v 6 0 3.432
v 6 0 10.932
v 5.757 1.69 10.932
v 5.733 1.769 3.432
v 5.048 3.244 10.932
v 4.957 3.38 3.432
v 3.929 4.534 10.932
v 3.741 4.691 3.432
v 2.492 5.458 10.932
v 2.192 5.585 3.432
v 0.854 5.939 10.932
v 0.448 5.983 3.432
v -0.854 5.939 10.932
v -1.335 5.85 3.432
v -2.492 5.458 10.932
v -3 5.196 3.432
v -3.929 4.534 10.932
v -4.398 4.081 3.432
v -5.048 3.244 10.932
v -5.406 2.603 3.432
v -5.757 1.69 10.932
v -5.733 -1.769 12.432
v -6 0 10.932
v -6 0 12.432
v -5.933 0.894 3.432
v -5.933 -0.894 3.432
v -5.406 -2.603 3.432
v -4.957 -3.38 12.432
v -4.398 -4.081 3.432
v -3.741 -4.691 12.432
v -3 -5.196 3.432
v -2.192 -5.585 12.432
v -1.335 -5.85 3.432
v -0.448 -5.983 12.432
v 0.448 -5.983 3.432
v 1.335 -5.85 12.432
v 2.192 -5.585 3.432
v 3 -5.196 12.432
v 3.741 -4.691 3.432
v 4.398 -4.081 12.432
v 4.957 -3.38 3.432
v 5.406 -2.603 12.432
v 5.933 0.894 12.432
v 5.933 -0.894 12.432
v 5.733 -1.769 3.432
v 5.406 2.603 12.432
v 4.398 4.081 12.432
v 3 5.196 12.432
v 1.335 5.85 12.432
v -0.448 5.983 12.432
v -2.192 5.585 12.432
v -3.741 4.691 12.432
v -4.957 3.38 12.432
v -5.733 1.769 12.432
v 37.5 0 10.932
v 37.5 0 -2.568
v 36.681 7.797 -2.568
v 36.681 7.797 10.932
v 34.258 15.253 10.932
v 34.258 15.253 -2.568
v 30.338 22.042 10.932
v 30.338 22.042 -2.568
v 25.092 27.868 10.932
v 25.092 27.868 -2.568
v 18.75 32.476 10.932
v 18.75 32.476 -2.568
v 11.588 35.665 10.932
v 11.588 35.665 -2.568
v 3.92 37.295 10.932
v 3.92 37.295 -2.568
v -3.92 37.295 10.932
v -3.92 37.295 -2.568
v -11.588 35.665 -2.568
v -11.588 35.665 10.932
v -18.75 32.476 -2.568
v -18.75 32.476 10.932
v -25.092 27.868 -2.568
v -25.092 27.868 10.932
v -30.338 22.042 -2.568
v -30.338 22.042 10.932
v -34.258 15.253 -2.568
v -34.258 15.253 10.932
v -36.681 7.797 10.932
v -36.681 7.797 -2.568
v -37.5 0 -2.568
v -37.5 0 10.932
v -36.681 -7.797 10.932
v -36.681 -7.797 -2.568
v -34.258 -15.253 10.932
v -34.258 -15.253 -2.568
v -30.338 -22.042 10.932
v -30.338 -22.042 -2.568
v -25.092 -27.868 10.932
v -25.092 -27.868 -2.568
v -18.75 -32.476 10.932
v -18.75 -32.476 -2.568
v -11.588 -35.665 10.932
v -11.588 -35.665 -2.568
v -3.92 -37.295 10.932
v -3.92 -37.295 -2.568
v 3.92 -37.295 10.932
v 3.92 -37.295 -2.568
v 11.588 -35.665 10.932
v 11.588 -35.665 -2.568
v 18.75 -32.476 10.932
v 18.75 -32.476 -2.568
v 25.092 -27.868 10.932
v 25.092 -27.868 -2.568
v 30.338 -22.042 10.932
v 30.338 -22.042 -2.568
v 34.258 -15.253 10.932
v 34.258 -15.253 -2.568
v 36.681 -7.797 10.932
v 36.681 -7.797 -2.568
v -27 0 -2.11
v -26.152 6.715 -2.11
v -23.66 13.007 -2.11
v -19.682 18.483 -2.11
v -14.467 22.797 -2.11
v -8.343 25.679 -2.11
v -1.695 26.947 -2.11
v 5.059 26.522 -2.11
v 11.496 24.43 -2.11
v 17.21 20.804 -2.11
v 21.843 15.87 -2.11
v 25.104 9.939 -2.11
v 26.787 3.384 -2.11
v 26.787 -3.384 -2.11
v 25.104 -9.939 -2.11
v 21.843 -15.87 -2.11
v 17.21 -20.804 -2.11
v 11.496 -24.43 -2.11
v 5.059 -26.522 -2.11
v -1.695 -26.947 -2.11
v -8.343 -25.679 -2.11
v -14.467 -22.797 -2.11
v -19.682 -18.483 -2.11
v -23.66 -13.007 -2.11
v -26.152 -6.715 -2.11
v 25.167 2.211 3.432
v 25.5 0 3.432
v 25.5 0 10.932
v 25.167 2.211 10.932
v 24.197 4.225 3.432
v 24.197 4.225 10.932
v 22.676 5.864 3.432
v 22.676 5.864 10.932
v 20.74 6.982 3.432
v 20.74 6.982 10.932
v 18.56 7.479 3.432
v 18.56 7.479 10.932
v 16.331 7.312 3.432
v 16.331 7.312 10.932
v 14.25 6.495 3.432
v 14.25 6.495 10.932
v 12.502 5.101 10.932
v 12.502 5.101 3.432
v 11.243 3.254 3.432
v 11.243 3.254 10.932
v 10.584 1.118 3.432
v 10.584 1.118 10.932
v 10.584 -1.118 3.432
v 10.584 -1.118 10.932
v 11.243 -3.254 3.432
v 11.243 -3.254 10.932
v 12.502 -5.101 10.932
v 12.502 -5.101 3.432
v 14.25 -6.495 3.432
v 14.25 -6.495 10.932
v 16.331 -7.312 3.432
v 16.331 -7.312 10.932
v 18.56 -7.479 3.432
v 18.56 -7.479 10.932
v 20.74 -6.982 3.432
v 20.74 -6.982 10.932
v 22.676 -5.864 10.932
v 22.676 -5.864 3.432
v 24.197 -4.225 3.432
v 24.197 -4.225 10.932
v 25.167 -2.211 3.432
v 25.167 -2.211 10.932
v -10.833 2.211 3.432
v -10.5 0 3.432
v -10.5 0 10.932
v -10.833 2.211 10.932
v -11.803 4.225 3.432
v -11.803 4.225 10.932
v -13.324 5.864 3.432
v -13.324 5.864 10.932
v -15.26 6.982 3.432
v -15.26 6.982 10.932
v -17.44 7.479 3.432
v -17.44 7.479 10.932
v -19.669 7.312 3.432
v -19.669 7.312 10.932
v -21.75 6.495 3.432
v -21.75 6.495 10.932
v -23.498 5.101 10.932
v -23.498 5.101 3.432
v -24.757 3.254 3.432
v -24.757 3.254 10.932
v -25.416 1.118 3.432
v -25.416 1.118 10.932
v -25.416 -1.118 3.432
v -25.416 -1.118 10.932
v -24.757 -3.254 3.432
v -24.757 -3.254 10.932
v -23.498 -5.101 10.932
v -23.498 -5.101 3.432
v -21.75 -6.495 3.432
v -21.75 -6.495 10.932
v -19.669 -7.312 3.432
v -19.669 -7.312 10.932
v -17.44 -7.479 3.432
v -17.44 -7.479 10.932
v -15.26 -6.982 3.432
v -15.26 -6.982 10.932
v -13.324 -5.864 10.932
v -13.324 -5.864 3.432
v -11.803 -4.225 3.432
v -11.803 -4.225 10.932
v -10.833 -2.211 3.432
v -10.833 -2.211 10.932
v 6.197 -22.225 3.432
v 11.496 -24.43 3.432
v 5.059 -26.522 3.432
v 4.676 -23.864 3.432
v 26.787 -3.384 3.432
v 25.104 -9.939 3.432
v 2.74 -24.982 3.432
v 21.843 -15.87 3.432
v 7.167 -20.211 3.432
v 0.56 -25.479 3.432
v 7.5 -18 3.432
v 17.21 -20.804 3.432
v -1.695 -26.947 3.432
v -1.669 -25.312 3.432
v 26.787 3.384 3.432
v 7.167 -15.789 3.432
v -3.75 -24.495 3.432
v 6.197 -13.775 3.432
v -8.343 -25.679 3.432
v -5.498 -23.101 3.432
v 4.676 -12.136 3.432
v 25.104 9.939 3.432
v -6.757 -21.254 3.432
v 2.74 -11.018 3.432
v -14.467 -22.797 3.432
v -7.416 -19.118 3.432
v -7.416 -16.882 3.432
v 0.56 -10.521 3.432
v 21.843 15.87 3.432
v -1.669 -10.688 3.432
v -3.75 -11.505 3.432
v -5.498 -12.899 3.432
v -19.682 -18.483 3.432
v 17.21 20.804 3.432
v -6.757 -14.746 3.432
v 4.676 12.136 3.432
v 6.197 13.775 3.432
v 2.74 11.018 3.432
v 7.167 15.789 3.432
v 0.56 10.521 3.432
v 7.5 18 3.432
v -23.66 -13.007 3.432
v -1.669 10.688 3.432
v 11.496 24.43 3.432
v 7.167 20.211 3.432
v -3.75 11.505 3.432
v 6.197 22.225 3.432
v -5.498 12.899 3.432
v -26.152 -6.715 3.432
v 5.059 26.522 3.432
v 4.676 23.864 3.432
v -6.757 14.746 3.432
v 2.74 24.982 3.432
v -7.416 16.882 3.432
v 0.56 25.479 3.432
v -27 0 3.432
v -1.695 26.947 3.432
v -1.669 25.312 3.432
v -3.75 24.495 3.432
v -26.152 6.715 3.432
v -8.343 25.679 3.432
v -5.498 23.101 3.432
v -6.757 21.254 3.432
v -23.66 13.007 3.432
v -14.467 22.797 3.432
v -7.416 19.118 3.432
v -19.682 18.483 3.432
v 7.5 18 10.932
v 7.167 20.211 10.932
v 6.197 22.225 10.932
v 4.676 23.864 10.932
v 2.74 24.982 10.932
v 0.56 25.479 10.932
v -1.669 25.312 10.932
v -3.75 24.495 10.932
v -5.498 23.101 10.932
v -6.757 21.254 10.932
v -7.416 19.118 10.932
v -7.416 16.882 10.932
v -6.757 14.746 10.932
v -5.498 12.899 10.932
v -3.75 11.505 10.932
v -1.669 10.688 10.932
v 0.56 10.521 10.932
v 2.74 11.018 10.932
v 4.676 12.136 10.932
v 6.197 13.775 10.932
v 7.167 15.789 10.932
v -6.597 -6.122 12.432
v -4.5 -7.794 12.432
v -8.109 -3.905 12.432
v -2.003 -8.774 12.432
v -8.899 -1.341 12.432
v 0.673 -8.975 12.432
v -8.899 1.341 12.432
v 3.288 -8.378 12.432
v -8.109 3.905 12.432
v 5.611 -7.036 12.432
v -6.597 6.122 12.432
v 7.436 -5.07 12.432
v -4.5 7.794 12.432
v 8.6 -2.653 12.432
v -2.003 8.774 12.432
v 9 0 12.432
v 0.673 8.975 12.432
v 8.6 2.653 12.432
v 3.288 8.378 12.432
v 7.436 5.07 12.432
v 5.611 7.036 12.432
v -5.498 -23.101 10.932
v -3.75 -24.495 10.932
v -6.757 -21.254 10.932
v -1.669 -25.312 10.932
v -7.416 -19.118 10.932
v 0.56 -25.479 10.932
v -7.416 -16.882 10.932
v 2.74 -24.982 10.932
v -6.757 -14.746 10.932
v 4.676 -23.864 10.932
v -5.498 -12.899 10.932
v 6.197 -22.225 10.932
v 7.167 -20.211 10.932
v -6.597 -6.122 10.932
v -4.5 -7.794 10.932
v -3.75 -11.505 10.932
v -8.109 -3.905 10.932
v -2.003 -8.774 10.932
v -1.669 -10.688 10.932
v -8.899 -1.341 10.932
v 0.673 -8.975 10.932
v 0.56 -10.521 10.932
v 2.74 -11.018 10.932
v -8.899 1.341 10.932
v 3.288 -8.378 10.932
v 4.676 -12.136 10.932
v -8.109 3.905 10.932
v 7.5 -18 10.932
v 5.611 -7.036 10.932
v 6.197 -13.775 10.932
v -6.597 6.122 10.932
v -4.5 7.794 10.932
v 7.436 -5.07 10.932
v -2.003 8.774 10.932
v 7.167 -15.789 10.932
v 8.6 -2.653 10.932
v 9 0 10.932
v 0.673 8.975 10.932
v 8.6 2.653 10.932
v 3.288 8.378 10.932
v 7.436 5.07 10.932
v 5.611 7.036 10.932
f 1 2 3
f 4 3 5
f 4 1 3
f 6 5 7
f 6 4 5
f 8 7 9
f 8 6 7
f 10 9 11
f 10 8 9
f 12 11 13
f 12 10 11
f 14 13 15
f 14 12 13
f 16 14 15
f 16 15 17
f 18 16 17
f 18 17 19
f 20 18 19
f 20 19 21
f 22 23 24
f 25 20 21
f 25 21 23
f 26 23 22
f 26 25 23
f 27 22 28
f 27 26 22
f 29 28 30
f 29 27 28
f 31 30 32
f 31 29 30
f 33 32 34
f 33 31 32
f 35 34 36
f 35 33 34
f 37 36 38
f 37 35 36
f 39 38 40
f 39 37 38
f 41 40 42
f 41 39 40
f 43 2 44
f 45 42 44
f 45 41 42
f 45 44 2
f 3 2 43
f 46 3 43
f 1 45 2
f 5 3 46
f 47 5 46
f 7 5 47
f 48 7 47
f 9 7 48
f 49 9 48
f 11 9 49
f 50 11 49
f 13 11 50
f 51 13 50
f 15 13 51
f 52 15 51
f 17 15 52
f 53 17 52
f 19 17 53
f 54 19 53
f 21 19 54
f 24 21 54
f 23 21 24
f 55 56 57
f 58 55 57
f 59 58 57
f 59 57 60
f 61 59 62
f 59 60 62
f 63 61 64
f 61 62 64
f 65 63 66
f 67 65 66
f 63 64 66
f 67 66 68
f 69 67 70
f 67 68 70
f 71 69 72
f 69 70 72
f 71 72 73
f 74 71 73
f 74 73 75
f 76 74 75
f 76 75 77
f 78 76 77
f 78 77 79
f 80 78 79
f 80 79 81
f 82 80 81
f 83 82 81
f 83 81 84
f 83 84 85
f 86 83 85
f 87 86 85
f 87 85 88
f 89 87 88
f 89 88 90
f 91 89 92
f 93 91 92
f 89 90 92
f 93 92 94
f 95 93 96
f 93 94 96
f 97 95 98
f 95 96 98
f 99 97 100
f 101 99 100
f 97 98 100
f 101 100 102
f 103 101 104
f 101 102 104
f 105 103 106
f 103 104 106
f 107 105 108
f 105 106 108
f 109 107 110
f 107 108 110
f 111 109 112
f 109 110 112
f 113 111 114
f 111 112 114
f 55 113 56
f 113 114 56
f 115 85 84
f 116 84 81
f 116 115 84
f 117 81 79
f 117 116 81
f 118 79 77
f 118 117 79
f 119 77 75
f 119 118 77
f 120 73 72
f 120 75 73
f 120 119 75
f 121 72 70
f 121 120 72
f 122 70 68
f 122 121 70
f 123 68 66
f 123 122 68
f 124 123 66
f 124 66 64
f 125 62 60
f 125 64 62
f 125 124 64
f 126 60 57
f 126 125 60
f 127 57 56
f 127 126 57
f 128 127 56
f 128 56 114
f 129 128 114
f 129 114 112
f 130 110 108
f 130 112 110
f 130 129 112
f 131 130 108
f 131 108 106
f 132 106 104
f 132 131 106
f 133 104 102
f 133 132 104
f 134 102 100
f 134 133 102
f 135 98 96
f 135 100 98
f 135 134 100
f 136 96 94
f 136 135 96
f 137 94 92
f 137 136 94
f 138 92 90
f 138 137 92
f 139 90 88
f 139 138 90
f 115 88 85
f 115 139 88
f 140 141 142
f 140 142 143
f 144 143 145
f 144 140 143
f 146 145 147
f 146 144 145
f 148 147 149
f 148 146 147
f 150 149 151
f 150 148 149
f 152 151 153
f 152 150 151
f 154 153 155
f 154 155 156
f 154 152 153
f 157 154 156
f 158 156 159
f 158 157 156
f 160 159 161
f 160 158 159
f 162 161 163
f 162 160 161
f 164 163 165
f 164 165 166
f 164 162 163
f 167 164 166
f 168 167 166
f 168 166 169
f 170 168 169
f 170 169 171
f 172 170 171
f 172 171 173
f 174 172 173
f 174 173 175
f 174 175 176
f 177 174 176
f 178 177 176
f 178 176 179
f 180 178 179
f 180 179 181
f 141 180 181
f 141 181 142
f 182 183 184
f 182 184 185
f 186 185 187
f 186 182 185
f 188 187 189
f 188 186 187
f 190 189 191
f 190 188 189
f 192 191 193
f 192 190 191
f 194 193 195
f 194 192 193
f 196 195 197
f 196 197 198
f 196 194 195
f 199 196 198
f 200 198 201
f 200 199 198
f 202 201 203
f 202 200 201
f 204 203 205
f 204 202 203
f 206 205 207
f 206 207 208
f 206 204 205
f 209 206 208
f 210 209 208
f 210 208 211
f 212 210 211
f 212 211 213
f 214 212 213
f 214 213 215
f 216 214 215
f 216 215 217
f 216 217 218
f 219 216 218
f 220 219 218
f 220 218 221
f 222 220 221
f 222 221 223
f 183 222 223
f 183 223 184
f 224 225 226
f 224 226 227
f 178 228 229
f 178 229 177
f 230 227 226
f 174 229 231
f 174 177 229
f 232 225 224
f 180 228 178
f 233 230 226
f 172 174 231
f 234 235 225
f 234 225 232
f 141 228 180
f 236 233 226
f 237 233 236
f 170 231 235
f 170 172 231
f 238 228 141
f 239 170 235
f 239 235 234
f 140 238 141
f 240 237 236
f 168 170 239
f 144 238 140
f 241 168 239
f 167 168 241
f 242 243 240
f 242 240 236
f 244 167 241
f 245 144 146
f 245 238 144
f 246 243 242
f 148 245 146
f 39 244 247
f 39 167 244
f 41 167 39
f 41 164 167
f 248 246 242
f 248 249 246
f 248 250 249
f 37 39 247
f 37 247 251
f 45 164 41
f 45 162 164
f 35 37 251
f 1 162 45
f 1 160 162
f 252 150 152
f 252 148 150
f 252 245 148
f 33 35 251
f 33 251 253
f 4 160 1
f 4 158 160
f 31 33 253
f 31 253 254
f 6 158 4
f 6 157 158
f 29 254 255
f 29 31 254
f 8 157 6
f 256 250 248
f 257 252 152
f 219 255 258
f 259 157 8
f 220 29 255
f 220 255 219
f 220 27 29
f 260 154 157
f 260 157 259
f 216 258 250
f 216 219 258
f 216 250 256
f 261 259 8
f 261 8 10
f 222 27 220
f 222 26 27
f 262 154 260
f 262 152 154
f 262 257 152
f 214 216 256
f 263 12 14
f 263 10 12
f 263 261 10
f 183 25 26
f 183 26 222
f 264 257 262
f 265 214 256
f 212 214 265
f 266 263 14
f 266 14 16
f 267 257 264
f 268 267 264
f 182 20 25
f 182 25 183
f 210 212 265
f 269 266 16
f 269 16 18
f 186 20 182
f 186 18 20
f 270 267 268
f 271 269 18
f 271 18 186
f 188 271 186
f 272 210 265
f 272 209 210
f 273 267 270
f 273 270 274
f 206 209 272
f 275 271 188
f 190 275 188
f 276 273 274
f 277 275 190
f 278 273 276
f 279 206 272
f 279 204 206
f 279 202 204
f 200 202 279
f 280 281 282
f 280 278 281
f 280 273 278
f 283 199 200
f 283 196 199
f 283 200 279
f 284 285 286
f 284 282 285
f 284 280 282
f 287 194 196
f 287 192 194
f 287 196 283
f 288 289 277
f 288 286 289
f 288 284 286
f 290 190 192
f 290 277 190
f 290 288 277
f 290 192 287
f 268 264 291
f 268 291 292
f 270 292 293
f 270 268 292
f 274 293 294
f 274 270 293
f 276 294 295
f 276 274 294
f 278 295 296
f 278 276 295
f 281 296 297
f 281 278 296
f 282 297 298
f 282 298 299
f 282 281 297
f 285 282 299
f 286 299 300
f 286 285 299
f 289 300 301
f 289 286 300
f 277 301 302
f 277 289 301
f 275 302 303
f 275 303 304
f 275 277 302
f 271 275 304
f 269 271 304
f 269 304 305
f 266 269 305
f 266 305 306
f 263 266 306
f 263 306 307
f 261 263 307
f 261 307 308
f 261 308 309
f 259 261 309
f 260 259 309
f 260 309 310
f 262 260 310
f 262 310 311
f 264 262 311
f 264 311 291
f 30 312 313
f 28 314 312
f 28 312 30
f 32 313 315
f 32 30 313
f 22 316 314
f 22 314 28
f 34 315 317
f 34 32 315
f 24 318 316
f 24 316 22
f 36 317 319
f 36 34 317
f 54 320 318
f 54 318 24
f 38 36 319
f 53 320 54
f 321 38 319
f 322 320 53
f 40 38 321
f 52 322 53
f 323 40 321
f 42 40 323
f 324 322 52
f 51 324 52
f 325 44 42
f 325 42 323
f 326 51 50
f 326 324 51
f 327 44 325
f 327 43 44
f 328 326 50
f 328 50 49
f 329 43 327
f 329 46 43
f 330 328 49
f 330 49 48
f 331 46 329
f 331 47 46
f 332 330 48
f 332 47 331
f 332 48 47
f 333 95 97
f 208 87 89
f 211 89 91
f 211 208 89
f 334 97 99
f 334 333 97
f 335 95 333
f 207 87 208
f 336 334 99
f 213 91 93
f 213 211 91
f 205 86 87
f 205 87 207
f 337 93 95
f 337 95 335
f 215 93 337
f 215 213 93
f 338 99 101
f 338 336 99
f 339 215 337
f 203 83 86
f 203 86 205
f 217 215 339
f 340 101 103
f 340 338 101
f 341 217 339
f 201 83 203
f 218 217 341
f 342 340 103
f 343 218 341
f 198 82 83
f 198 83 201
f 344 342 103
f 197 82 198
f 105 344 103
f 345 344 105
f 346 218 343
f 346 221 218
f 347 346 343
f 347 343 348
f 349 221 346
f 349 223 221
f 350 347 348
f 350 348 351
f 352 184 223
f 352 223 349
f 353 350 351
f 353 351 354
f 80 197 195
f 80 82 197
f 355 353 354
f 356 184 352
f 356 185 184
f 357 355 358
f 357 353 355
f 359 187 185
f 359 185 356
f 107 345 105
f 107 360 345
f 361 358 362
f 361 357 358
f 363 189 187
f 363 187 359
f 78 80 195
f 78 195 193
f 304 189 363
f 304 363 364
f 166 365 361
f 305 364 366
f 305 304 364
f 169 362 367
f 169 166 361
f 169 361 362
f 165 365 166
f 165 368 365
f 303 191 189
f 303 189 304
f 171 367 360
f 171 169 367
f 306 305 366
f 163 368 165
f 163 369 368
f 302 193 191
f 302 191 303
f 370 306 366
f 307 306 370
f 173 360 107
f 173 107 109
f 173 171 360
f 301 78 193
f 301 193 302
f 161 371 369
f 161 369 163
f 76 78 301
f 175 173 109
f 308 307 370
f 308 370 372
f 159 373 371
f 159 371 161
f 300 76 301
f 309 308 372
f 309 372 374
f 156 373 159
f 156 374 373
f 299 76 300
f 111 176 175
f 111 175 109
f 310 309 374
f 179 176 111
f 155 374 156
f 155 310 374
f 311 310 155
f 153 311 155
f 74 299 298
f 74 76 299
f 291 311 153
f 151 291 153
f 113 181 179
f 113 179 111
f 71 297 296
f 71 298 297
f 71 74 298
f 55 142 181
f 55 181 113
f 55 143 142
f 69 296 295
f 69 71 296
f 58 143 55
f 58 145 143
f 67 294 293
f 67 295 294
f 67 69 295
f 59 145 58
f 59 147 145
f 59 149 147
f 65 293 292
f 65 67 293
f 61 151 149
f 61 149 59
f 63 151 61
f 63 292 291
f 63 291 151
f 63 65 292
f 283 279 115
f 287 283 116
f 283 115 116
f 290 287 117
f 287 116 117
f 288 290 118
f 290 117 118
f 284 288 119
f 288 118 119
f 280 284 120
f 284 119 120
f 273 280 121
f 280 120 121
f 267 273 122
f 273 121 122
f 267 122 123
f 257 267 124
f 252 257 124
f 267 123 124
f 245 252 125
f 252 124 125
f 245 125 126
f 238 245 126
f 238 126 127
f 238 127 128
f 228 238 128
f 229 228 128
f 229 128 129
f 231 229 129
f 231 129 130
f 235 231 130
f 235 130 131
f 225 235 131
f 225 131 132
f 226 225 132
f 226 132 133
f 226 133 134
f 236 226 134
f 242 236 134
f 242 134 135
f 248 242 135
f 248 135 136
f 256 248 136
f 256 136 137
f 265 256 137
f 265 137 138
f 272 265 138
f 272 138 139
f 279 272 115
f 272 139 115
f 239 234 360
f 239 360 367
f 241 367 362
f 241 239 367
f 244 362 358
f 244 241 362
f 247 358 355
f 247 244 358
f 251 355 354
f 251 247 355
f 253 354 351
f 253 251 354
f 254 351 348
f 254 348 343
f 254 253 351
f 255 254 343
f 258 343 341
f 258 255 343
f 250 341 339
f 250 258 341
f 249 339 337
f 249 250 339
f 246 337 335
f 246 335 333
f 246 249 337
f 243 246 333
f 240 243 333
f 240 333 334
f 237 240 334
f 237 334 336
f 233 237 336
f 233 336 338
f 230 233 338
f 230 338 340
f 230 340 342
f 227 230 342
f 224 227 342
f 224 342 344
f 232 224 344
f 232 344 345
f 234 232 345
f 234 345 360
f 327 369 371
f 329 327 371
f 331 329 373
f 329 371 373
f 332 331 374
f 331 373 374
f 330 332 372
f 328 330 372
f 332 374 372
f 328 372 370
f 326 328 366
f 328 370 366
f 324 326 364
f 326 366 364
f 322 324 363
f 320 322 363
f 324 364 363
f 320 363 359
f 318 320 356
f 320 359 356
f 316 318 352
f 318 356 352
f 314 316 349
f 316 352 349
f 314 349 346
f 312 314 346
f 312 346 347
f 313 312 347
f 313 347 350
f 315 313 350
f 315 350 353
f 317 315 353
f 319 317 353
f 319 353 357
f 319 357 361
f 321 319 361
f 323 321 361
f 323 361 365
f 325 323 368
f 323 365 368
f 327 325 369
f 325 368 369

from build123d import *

# Parameters (mm, degrees)
SKETCH1_R           = 25
SKETCH1_R_2         = 5
SKETCH1_R_3         = 4
BOSS_EXTRUDE1_DEPTH = 9
SKETCH2_R           = 18
CUT_EXTRUDE1_DEPTH  = 4
SKETCH3_R           = 6
SKETCH3_R_2         = 4
BOSS_EXTRUDE2_DEPTH = 1
SCALE1_SCALE        = 1.5


with BuildPart() as part:
    # Sketch1 → Boss-Extrude1 (new body)
    with BuildSketch(Plane.XY):
        Circle(SKETCH1_R)
        with Locations((0, 12)):
            Circle(SKETCH1_R_2, mode=Mode.SUBTRACT)
        with Locations((12, 0)):
            Circle(SKETCH1_R_2, mode=Mode.SUBTRACT)
        with Locations((0, -12)):
            Circle(SKETCH1_R_2, mode=Mode.SUBTRACT)
        with Locations((-12, 0)):
            Circle(SKETCH1_R_2, mode=Mode.SUBTRACT)
        Circle(SKETCH1_R_3, mode=Mode.SUBTRACT)
    extrude(amount=BOSS_EXTRUDE1_DEPTH)

    # Sketch2 → Cut-Extrude1 (cut)
    with BuildSketch(Plane(origin=(0, 0, 0), x_dir=(-1, 0, 0), z_dir=(0, 0, -1))):
        Circle(SKETCH2_R)
    extrude(amount=-CUT_EXTRUDE1_DEPTH, mode=Mode.SUBTRACT)

    # Sketch3 → Boss-Extrude2 (add)
    with BuildSketch(Plane.XY.offset(9)):
        Circle(SKETCH3_R)
        with Locations(Location((0, 0, 0), (0, 0, 180))):
            Circle(SKETCH3_R_2, mode=Mode.SUBTRACT)
    extrude(amount=BOSS_EXTRUDE2_DEPTH)

    # Sketch4 → Cut-Revolve2 (revolve, cut)
    with BuildSketch(Plane(origin=(0, 0, 0), x_dir=(1, 0, 0), z_dir=(0, 1, 0))):
        Polygon((-25, 0), (0, -1.091523573), (0, 0), align=None)
    revolve(axis=Axis((0, 0, 1.091523573), (0, 0, -1)), mode=Mode.SUBTRACT)


with BuildPart() as part_1:
    # Scale1: scaled about (0, 0, 5.136545389)
    add(part.part.scale(SCALE1_SCALE).moved(Location((0, 0, -2.568272695))))


solid = part_1.part
